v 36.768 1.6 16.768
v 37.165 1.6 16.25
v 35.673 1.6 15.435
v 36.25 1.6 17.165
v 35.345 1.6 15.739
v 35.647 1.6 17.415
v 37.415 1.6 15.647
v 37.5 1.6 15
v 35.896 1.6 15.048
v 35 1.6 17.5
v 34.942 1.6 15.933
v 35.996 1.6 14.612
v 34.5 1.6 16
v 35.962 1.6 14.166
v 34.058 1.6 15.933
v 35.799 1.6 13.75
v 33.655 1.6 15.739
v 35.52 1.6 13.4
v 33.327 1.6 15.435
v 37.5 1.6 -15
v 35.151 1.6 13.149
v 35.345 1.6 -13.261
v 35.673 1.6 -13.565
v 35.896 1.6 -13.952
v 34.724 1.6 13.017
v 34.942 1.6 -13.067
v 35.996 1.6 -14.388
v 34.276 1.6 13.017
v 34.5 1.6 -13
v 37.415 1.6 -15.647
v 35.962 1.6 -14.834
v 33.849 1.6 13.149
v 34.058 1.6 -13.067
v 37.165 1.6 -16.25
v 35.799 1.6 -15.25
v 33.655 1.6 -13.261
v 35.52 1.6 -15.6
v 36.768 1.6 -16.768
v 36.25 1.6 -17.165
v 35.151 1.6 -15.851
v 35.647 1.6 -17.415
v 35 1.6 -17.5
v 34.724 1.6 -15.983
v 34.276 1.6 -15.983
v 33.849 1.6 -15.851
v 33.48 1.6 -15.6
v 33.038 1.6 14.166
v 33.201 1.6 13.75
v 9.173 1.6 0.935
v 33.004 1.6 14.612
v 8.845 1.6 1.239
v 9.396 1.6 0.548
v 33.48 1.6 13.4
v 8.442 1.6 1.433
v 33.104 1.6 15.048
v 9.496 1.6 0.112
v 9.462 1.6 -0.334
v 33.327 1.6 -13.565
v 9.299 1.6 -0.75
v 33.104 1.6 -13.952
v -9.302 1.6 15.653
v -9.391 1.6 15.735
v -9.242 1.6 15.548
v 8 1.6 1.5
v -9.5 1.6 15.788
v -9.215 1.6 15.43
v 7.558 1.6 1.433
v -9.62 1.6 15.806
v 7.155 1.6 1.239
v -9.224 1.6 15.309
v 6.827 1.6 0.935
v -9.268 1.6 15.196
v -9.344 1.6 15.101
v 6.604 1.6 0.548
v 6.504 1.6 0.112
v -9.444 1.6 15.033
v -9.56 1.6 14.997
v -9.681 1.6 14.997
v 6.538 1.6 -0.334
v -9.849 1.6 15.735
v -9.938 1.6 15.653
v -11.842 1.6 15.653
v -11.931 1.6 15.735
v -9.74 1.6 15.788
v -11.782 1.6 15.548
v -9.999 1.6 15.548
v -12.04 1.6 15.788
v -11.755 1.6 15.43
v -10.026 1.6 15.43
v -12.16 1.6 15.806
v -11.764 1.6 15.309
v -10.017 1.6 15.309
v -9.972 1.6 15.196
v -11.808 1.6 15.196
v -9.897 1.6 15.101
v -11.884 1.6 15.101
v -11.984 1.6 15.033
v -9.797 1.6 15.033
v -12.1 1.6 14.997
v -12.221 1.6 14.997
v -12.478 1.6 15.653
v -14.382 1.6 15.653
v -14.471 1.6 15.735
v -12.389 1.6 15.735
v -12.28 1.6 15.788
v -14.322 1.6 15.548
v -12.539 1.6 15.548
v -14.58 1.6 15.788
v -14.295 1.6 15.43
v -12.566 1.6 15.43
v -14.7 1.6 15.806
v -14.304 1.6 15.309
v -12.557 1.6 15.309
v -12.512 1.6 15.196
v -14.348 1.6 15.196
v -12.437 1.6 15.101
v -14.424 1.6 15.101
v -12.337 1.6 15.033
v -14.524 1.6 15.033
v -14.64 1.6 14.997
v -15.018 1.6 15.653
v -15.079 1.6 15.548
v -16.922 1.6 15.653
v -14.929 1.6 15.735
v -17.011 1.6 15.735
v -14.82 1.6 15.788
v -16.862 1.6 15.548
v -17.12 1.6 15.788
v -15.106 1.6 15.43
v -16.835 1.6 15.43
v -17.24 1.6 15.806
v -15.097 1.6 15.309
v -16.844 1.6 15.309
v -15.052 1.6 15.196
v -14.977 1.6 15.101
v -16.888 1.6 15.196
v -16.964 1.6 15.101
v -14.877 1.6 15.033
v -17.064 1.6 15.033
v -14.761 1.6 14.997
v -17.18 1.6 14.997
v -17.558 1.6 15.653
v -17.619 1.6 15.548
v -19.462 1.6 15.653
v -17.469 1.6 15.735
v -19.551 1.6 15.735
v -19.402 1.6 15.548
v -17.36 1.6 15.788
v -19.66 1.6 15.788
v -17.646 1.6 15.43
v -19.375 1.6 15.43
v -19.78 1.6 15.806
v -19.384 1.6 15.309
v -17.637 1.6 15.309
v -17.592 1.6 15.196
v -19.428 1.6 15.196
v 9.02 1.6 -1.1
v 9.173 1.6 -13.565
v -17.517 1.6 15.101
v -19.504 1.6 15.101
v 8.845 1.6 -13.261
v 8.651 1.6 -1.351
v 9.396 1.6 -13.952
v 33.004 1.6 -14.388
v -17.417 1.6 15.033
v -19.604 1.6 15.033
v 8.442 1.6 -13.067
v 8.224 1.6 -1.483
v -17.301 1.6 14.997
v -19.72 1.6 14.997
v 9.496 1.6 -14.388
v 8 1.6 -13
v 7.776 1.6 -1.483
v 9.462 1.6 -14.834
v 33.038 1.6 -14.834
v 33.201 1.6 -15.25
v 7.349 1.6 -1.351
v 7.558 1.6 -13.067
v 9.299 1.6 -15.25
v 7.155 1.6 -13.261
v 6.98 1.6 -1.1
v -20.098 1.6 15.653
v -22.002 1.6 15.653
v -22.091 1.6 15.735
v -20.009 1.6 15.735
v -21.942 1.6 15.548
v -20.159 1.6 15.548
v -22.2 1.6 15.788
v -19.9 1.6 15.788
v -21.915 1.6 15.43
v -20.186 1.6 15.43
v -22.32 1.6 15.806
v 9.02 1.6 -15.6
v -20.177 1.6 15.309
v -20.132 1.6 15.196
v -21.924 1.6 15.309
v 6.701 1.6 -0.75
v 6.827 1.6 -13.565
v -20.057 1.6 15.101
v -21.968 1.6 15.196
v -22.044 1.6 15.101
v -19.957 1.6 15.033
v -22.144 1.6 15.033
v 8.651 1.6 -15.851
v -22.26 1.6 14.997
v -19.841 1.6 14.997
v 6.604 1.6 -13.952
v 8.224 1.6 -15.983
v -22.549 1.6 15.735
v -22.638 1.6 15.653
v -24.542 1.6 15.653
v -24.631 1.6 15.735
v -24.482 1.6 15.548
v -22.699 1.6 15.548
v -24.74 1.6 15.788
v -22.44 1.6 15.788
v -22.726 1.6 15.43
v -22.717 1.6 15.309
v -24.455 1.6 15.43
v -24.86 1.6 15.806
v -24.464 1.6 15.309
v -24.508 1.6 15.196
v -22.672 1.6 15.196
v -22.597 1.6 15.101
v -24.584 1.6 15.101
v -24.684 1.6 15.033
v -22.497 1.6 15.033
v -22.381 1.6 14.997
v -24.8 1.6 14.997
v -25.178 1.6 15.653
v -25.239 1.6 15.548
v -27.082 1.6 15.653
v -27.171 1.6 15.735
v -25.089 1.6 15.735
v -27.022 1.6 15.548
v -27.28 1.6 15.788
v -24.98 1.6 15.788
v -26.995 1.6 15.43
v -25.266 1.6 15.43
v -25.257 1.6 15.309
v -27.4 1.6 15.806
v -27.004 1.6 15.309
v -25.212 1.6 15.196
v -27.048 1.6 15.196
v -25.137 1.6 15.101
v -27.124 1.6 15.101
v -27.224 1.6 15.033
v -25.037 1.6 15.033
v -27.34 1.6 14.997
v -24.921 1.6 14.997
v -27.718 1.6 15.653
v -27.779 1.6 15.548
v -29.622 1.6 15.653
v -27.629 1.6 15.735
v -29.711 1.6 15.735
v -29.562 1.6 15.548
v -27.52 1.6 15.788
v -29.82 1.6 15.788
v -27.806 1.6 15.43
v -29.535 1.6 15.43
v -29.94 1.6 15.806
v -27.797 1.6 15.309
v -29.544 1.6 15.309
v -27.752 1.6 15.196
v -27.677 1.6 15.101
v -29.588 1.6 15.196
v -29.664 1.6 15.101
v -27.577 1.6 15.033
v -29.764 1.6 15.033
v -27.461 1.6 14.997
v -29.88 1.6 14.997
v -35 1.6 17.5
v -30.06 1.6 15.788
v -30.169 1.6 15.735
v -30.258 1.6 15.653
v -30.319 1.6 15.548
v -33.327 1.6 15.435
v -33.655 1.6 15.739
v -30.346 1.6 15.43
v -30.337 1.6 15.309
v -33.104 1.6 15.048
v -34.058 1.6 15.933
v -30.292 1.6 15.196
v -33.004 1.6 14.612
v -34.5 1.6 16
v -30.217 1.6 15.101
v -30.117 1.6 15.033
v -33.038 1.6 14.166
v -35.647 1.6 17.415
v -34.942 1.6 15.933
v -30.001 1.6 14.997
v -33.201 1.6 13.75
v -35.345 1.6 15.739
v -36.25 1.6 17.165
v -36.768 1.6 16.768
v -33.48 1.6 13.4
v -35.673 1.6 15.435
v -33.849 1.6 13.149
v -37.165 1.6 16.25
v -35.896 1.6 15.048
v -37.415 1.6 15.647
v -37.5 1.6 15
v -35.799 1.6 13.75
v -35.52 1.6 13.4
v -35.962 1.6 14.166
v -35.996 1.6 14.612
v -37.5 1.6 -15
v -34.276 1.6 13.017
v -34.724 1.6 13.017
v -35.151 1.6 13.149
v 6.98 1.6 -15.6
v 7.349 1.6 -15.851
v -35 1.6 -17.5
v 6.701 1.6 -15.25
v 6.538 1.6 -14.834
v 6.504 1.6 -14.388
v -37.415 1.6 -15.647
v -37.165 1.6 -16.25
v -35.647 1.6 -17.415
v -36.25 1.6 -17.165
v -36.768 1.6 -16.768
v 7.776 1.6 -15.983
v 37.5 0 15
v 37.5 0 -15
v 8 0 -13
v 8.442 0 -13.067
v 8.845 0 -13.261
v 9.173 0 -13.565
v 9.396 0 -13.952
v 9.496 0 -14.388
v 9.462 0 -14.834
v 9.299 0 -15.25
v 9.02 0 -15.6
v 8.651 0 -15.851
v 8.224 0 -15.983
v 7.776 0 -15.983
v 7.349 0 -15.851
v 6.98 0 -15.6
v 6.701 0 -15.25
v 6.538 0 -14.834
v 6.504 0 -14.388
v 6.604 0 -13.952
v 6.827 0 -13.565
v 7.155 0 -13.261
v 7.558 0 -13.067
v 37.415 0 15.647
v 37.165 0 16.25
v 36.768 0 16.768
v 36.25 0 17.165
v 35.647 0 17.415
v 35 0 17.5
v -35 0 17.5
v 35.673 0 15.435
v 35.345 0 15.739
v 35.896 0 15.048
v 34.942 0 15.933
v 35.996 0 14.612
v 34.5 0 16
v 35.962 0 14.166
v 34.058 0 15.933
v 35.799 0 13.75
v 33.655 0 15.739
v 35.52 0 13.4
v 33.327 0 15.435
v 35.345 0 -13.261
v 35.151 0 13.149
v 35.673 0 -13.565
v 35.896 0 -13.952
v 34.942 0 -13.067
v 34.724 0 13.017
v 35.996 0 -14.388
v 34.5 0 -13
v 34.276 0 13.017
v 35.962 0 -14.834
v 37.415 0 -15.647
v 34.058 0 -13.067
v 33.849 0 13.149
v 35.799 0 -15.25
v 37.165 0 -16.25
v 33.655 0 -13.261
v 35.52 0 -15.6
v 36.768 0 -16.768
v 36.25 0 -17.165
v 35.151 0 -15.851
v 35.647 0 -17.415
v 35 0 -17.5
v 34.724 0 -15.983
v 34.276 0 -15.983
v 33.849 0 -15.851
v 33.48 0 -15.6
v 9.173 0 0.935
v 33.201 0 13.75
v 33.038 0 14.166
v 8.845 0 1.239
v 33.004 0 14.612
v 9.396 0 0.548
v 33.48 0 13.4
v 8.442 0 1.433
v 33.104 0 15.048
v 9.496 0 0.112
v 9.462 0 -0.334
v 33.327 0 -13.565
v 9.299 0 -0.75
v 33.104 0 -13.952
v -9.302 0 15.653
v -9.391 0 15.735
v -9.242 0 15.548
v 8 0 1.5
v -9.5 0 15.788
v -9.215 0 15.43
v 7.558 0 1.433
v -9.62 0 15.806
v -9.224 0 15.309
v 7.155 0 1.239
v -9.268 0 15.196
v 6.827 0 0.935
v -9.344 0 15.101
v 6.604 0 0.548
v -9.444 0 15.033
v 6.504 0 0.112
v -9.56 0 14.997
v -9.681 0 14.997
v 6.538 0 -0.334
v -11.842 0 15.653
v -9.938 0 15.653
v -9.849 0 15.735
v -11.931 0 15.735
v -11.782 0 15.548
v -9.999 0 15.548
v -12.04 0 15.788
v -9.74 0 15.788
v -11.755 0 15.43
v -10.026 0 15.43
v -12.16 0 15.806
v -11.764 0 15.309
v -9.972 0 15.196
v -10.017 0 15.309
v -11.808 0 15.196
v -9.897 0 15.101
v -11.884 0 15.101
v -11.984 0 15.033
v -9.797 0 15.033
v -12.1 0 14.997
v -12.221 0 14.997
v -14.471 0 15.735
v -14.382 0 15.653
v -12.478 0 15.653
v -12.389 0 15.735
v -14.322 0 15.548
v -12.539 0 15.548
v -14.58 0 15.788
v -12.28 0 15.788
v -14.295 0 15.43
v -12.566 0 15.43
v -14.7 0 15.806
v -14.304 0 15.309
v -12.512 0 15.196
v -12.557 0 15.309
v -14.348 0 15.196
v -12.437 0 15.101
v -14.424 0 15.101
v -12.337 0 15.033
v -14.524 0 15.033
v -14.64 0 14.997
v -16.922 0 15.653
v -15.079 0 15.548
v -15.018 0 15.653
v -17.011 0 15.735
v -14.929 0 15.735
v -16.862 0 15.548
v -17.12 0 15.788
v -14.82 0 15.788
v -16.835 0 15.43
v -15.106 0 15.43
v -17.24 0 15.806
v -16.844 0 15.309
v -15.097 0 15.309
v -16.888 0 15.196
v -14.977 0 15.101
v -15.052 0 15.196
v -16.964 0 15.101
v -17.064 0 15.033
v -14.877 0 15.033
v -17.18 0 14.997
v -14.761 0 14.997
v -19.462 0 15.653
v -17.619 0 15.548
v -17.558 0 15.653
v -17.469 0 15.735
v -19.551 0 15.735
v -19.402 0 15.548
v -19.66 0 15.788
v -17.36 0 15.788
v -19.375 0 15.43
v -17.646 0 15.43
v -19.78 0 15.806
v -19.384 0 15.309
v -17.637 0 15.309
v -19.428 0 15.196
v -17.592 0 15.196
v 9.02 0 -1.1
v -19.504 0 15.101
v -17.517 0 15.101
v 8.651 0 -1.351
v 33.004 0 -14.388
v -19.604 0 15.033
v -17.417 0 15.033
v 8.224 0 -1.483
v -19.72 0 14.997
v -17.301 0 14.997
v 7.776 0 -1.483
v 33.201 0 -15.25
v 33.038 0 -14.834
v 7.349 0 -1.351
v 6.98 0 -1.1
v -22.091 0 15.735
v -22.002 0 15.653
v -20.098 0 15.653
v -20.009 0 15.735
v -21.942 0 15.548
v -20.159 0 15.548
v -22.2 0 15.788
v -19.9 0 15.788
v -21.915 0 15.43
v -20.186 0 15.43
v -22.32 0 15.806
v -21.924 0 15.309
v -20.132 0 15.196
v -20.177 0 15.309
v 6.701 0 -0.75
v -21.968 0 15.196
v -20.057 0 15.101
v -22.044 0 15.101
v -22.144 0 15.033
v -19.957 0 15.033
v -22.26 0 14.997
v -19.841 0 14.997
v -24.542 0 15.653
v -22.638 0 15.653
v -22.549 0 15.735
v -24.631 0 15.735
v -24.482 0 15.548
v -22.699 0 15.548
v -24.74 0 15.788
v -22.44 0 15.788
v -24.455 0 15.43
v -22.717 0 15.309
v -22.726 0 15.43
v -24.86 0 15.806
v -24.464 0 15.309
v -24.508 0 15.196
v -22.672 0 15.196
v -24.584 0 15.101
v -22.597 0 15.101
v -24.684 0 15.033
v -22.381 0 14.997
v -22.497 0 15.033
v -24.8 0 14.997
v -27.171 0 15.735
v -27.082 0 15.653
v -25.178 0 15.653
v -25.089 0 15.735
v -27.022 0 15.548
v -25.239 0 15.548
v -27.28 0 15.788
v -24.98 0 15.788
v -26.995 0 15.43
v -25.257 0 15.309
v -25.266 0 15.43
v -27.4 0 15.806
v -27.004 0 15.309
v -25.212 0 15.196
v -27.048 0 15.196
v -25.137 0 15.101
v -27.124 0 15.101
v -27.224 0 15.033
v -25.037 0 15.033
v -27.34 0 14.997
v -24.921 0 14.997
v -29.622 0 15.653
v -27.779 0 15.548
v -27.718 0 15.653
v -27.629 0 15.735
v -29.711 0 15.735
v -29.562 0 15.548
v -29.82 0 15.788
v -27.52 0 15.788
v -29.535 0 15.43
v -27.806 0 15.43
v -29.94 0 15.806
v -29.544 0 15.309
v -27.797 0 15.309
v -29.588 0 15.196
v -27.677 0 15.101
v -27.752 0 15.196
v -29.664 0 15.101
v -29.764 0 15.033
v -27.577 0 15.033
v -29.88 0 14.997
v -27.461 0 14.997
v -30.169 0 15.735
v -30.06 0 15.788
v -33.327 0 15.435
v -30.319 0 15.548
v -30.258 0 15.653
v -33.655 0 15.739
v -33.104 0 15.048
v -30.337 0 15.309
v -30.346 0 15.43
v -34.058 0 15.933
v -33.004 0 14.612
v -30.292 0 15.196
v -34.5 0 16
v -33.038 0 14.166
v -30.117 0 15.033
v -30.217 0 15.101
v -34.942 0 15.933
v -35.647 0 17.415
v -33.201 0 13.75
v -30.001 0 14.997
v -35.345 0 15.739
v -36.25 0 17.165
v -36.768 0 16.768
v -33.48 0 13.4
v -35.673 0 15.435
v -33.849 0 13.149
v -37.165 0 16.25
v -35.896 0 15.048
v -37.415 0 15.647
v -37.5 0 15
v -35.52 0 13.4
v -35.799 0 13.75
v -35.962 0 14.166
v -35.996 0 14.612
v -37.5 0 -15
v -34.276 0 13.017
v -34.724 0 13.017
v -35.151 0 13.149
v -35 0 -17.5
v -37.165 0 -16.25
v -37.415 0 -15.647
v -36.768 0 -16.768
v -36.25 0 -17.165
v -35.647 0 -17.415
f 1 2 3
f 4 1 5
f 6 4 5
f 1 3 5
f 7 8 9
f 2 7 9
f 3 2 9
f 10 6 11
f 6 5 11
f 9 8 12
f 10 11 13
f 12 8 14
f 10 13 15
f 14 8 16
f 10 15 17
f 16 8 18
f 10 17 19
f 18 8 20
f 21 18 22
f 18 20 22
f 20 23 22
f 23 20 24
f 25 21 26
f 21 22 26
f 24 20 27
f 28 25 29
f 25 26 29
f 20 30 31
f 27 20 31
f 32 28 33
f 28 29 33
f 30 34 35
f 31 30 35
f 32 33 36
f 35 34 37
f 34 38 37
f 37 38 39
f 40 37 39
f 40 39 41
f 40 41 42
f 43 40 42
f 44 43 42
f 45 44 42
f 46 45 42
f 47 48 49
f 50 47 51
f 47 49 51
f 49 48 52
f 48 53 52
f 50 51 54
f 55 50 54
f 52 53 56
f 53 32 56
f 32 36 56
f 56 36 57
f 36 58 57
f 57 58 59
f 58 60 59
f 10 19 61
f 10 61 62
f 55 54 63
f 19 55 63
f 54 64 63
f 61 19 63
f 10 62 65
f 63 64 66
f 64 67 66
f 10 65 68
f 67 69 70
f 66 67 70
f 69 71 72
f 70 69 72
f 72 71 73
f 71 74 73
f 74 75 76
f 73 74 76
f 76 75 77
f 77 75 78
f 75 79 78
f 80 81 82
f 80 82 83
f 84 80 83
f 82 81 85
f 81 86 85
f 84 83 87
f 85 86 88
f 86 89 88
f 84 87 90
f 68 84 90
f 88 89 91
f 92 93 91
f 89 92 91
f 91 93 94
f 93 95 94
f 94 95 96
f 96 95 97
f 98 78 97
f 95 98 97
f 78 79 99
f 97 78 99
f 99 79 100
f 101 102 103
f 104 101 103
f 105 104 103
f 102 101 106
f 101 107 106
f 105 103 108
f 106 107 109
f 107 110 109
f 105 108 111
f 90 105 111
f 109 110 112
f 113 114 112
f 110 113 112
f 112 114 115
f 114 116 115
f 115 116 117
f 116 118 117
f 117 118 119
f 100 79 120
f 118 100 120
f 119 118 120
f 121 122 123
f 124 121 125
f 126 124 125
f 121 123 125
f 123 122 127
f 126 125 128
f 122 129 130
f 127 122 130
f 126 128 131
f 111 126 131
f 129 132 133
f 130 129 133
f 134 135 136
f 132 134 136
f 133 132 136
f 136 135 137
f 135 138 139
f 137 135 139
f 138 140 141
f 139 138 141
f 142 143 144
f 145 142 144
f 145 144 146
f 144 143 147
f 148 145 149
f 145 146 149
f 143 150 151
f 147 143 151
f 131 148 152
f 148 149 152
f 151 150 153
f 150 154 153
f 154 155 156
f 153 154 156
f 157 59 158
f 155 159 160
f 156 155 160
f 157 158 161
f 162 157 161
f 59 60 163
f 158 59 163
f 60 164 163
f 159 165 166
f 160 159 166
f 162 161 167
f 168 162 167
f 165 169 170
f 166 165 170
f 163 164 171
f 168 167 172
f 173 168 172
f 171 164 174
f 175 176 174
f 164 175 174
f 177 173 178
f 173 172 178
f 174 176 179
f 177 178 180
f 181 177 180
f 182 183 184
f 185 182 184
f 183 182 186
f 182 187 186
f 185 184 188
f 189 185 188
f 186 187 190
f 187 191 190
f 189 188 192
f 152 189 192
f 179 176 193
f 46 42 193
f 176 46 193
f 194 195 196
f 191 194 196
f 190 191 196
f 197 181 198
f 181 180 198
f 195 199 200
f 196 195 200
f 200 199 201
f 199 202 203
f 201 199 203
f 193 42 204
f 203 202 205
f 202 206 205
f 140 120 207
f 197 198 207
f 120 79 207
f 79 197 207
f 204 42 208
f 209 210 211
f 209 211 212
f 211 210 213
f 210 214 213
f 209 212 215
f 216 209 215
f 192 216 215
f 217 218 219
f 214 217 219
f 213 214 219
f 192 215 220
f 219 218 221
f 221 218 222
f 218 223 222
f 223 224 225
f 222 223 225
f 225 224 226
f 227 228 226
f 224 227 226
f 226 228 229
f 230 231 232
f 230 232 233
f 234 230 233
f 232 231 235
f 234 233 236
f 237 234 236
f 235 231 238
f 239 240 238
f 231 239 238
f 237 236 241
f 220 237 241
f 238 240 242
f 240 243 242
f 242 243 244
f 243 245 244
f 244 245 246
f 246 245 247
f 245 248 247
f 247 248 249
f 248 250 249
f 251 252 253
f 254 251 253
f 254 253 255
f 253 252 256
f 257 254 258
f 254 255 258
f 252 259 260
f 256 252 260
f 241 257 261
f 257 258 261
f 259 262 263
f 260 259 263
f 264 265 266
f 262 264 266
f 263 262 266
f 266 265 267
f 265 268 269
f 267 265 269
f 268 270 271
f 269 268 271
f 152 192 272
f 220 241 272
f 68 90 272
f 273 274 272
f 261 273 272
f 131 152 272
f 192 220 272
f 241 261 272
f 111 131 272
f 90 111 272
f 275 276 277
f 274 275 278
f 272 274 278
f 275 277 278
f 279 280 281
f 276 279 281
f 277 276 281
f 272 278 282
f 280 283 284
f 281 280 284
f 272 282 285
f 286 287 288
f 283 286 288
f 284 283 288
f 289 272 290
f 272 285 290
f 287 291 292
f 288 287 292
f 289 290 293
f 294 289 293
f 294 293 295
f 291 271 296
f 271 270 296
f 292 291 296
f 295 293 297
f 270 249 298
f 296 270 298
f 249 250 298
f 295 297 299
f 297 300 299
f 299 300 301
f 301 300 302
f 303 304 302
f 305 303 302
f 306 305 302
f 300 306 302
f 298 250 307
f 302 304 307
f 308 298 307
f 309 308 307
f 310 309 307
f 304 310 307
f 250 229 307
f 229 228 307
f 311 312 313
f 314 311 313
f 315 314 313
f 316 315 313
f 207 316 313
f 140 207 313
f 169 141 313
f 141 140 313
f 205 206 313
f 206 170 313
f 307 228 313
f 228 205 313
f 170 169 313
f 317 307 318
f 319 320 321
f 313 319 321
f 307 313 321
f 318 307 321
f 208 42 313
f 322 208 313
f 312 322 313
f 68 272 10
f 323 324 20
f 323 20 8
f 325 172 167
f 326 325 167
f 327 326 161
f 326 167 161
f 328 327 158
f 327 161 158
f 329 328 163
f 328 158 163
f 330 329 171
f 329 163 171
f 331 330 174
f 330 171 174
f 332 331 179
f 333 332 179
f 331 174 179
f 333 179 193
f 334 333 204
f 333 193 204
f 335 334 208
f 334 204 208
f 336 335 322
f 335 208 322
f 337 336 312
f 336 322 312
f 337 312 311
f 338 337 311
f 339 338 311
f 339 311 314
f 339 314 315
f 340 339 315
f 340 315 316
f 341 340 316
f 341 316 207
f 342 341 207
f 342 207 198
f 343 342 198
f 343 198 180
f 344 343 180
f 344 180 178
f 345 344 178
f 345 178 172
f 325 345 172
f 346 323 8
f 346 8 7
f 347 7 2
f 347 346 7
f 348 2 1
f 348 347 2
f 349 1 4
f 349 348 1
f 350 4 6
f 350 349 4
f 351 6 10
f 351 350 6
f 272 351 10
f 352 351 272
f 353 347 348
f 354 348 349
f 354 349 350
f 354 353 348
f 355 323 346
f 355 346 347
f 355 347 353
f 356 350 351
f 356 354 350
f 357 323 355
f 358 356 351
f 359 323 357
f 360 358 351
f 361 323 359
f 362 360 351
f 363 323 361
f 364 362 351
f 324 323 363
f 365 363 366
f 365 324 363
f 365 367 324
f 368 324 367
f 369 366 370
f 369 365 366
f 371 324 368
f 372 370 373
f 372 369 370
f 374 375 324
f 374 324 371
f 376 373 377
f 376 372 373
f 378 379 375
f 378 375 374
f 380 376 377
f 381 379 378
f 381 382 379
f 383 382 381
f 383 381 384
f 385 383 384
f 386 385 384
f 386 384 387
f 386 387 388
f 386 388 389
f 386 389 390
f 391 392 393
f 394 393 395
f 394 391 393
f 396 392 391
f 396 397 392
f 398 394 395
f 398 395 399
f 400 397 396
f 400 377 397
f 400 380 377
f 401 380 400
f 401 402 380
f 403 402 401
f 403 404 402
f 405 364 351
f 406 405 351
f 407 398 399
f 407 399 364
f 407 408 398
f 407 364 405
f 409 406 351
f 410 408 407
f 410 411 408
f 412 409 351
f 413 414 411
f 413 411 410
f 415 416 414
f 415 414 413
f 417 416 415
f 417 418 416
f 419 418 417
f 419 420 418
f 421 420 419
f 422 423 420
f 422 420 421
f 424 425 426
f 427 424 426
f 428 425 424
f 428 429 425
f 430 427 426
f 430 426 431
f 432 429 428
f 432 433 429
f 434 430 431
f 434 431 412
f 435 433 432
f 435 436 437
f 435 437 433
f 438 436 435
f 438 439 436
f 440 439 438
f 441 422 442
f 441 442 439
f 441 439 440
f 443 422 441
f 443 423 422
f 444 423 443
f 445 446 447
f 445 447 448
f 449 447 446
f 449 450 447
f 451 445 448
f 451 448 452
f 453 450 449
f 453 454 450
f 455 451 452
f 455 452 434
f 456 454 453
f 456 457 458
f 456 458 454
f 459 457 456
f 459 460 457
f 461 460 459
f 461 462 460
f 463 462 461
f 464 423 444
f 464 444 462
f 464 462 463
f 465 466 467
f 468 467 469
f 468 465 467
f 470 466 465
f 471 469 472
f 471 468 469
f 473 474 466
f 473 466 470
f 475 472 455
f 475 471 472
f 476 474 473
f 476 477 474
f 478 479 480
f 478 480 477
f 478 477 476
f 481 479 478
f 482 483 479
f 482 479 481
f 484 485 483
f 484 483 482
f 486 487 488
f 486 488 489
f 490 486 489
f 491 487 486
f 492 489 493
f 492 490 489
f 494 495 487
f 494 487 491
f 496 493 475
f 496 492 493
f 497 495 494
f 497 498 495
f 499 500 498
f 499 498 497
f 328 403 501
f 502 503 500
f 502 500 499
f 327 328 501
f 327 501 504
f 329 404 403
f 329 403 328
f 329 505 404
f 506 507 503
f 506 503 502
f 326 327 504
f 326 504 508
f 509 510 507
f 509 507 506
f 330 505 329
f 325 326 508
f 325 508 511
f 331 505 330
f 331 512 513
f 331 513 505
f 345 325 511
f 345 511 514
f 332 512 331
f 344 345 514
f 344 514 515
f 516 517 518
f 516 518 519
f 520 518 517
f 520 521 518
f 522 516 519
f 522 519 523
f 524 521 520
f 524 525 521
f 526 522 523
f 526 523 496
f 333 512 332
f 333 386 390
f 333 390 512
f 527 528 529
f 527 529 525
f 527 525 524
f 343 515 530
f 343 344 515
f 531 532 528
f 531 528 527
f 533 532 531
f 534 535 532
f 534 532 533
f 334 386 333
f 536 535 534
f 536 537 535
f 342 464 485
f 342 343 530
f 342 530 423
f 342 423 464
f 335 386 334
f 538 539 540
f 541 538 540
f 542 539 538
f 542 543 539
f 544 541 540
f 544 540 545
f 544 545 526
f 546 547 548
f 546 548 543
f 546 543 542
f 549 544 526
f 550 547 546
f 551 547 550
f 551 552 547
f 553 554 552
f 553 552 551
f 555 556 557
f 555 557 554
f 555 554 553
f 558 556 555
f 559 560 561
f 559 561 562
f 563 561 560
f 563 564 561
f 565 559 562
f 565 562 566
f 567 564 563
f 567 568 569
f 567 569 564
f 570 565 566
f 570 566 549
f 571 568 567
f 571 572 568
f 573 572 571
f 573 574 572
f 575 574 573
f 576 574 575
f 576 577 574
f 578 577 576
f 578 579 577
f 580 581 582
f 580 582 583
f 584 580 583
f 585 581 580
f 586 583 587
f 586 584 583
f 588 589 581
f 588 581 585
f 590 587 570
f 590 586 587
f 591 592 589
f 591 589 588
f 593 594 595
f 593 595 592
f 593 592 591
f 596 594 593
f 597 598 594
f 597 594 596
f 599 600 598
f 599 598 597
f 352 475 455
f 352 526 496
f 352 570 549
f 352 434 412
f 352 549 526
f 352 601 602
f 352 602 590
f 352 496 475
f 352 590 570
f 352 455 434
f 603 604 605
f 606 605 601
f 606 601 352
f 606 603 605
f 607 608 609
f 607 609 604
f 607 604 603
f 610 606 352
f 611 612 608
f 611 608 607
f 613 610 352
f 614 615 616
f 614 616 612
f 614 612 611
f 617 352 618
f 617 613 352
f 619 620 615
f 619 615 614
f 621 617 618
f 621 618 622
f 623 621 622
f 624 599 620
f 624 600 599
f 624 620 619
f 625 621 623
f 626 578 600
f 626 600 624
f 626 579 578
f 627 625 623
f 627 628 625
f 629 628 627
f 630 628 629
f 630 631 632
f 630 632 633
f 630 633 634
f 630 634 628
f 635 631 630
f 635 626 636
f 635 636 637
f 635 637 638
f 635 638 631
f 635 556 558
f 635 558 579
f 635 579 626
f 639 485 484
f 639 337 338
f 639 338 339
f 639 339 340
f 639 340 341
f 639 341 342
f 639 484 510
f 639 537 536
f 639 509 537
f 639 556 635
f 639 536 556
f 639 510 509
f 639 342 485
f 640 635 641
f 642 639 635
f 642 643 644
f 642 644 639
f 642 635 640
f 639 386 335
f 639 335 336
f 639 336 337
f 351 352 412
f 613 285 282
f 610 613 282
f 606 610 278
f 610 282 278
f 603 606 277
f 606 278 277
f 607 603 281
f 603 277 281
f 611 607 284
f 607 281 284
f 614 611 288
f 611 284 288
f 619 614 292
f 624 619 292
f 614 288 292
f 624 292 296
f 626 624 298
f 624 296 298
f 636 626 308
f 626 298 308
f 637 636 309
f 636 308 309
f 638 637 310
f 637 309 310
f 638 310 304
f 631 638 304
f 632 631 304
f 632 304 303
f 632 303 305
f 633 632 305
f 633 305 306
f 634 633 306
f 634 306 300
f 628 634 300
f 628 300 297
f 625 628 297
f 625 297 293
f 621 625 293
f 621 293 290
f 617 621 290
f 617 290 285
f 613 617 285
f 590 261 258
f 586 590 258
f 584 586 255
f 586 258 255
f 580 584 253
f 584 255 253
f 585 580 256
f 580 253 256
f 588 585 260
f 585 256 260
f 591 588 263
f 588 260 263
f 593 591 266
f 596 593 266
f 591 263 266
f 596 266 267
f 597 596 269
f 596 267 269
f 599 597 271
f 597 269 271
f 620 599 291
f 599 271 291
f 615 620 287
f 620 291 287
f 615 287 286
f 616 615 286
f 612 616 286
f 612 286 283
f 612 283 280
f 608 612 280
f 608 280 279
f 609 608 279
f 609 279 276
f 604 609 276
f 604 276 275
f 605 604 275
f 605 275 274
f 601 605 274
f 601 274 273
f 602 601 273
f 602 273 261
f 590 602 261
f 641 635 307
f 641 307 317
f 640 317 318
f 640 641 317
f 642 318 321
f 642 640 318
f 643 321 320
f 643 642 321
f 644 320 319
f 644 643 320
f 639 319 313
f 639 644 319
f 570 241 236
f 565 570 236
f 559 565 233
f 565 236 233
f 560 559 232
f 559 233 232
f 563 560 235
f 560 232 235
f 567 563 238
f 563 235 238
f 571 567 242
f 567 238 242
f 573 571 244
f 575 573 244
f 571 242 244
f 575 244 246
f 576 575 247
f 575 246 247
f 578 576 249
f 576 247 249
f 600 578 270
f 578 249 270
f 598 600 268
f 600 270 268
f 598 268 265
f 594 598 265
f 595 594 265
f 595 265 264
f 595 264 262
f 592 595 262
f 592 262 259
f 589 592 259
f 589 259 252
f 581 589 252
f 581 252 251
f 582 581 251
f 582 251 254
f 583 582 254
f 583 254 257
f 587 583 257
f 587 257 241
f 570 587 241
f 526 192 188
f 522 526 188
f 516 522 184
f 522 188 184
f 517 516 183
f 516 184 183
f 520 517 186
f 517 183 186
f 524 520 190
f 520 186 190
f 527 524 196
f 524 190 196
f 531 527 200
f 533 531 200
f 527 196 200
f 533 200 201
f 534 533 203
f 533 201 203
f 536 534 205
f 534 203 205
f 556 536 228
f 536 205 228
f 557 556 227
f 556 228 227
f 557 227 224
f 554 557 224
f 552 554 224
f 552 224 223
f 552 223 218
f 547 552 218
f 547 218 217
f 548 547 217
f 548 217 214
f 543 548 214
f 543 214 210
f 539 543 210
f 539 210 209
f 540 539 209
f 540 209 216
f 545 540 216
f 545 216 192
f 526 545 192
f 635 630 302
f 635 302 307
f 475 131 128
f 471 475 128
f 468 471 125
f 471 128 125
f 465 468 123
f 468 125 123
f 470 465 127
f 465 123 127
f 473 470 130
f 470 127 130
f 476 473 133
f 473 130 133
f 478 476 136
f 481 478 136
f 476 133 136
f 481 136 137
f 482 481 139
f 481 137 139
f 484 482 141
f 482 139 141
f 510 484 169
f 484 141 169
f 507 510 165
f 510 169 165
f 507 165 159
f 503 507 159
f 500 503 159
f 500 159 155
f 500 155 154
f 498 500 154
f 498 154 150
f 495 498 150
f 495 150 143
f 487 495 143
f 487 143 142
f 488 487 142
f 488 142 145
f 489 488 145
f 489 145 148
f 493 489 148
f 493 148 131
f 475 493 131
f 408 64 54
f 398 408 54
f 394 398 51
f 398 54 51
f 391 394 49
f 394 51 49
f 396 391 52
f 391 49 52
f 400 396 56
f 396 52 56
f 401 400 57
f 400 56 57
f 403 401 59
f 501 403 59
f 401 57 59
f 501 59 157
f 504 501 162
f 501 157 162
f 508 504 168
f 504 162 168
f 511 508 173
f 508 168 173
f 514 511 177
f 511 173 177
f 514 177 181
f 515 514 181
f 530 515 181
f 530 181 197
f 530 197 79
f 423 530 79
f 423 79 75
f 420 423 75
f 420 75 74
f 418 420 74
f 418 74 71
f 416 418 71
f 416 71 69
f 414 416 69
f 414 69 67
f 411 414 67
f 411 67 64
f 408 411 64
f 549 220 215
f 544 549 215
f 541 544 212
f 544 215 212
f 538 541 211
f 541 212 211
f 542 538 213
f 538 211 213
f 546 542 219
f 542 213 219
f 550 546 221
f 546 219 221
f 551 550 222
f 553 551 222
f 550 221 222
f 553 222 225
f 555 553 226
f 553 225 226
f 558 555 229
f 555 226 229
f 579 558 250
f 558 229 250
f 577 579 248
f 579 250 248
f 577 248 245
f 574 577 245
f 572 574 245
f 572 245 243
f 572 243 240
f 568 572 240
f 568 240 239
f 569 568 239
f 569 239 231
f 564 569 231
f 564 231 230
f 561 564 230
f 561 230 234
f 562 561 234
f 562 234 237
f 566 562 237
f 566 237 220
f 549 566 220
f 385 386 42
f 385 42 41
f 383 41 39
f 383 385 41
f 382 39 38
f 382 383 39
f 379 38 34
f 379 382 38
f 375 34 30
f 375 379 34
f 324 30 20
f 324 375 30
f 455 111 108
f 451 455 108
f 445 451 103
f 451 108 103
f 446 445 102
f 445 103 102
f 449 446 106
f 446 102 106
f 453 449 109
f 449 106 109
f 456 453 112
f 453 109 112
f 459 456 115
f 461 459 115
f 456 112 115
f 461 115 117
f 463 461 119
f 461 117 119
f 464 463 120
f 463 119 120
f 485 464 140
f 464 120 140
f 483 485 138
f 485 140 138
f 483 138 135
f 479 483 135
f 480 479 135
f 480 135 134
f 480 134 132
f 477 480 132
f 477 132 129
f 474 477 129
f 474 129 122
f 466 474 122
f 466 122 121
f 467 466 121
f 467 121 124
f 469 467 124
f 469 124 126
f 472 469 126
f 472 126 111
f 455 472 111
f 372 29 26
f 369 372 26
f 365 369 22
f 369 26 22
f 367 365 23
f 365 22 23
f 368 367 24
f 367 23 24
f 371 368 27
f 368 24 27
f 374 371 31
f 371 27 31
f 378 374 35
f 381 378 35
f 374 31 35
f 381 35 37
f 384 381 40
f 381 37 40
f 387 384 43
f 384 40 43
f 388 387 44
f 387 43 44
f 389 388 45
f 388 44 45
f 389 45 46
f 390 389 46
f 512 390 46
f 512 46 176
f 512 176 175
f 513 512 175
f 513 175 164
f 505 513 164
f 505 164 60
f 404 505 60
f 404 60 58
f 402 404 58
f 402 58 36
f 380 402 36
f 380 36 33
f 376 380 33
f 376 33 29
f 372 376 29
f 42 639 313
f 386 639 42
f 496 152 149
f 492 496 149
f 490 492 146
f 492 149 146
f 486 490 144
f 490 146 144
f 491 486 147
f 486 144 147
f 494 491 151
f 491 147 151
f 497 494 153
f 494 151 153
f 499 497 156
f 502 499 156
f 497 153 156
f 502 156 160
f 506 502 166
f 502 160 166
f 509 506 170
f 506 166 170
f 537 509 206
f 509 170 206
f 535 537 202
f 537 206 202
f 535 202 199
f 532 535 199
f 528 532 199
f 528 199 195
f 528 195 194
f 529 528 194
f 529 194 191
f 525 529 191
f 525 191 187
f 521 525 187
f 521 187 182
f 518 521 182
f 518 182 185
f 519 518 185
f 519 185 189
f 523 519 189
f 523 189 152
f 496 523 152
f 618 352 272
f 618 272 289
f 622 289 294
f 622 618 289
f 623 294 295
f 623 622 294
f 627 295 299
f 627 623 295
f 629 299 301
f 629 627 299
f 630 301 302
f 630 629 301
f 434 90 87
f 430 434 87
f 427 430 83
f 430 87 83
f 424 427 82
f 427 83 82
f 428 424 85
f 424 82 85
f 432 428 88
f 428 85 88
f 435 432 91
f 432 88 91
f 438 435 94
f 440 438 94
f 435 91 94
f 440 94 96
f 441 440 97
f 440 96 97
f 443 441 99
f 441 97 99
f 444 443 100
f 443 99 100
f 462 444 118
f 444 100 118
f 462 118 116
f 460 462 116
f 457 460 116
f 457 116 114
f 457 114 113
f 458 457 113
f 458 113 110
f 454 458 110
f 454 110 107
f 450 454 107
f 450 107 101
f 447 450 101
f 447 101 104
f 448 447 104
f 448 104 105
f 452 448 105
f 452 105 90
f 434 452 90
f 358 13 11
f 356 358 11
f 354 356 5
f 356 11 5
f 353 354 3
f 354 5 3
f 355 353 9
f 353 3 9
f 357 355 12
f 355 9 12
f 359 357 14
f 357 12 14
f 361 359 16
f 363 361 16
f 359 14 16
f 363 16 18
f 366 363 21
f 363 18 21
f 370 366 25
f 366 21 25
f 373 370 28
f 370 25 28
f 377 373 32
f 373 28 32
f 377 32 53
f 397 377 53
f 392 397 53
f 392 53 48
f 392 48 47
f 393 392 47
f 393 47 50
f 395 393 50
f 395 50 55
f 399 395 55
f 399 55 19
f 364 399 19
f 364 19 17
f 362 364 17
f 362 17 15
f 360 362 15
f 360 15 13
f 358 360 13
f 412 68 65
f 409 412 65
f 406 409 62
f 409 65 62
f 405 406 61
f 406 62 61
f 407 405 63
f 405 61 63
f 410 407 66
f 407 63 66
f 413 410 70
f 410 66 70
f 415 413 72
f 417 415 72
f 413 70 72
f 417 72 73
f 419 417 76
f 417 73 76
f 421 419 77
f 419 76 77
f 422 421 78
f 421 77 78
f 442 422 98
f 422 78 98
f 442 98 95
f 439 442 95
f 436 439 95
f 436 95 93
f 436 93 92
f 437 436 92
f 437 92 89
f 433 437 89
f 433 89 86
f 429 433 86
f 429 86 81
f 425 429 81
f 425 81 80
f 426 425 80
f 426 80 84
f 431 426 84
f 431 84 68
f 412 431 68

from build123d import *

# Parameters (mm, degrees)
BOSS_EXTRUDE1_DEPTH = 1.6
SKETCH2_R           = 1.5
SKETCH2_R_2         = 0.406594982
CUT_EXTRUDE1_DEPTH  = 42.413282893


with BuildPart() as part:
    # Sketch1 → Boss-Extrude1 (new body)
    with BuildSketch(Plane(origin=(0, 0, 0), x_dir=(1, 0, 0), z_dir=(0, 1, 0))):
        with BuildLine():
            Line((-35, 17.5), (35, 17.5))
            ThreePointArc((35, 17.5), (36.767766953, 16.767766953), (37.5, 15))
            Line((37.5, 15), (37.5, -15))
            ThreePointArc((37.5, -15), (36.767766953, -16.767766953), (35, -17.5))
            Line((35, -17.5), (-35, -17.5))
            ThreePointArc((-35, -17.5), (-36.767766953, -16.767766953), (-37.5, -15))
            Line((-37.5, -15), (-37.5, 15))
            ThreePointArc((-37.5, 15), (-36.767766953, 16.767766953), (-35, 17.5))
        make_face()
    extrude(amount=BOSS_EXTRUDE1_DEPTH)

    # Sketch2 → Cut-Extrude1 (cut, through all)
    with BuildSketch(Plane(origin=(0, 1.6, 0), x_dir=(1, 0, 0), z_dir=(0, 1, 0))):
        with Locations(Location((-34.5, -14.5, 0), (0, 0, 270))):
            Circle(SKETCH2_R)
        with Locations(Location((34.5, -14.5, 0), (0, 0, 270))):
            Circle(SKETCH2_R)
        with Locations(Location((34.5, 14.5, 0), (0, 0, 270))):
            Circle(SKETCH2_R)
        with Locations(Location((8, 0, 0), (0, 0, 270))):
            Circle(SKETCH2_R)
        with Locations(Location((8, 14.5, 0), (0, 0, 270))):
            Circle(SKETCH2_R)
        with Locations(Location((-29.94018139, -15.399310559, 0), (0, 0, 270))):
            Circle(SKETCH2_R_2)
        with Locations(Location((-27.40018139, -15.399310559, 0), (0, 0, 270))):
            Circle(SKETCH2_R_2)
        with Locations(Location((-24.86018139, -15.399310559, 0), (0, 0, 270))):
            Circle(SKETCH2_R_2)
        with Locations(Location((-22.32018139, -15.399310559, 0), (0, 0, 270))):
            Circle(SKETCH2_R_2)
        with Locations(Location((-19.78018139, -15.399310559, 0), (0, 0, 270))):
            Circle(SKETCH2_R_2)
        with Locations(Location((-17.24018139, -15.399310559, 0), (0, 0, 270))):
            Circle(SKETCH2_R_2)
        with Locations(Location((-14.70018139, -15.399310559, 0), (0, 0, 270))):
            Circle(SKETCH2_R_2)
        with Locations(Location((-12.16018139, -15.399310559, 0), (0, 0, 270))):
            Circle(SKETCH2_R_2)
        with Locations(Location((-9.62018139, -15.399310559, 0), (0, 0, 270))):
            Circle(SKETCH2_R_2)
    extrude(amount=-CUT_EXTRUDE1_DEPTH, mode=Mode.SUBTRACT)


solid = part.part
